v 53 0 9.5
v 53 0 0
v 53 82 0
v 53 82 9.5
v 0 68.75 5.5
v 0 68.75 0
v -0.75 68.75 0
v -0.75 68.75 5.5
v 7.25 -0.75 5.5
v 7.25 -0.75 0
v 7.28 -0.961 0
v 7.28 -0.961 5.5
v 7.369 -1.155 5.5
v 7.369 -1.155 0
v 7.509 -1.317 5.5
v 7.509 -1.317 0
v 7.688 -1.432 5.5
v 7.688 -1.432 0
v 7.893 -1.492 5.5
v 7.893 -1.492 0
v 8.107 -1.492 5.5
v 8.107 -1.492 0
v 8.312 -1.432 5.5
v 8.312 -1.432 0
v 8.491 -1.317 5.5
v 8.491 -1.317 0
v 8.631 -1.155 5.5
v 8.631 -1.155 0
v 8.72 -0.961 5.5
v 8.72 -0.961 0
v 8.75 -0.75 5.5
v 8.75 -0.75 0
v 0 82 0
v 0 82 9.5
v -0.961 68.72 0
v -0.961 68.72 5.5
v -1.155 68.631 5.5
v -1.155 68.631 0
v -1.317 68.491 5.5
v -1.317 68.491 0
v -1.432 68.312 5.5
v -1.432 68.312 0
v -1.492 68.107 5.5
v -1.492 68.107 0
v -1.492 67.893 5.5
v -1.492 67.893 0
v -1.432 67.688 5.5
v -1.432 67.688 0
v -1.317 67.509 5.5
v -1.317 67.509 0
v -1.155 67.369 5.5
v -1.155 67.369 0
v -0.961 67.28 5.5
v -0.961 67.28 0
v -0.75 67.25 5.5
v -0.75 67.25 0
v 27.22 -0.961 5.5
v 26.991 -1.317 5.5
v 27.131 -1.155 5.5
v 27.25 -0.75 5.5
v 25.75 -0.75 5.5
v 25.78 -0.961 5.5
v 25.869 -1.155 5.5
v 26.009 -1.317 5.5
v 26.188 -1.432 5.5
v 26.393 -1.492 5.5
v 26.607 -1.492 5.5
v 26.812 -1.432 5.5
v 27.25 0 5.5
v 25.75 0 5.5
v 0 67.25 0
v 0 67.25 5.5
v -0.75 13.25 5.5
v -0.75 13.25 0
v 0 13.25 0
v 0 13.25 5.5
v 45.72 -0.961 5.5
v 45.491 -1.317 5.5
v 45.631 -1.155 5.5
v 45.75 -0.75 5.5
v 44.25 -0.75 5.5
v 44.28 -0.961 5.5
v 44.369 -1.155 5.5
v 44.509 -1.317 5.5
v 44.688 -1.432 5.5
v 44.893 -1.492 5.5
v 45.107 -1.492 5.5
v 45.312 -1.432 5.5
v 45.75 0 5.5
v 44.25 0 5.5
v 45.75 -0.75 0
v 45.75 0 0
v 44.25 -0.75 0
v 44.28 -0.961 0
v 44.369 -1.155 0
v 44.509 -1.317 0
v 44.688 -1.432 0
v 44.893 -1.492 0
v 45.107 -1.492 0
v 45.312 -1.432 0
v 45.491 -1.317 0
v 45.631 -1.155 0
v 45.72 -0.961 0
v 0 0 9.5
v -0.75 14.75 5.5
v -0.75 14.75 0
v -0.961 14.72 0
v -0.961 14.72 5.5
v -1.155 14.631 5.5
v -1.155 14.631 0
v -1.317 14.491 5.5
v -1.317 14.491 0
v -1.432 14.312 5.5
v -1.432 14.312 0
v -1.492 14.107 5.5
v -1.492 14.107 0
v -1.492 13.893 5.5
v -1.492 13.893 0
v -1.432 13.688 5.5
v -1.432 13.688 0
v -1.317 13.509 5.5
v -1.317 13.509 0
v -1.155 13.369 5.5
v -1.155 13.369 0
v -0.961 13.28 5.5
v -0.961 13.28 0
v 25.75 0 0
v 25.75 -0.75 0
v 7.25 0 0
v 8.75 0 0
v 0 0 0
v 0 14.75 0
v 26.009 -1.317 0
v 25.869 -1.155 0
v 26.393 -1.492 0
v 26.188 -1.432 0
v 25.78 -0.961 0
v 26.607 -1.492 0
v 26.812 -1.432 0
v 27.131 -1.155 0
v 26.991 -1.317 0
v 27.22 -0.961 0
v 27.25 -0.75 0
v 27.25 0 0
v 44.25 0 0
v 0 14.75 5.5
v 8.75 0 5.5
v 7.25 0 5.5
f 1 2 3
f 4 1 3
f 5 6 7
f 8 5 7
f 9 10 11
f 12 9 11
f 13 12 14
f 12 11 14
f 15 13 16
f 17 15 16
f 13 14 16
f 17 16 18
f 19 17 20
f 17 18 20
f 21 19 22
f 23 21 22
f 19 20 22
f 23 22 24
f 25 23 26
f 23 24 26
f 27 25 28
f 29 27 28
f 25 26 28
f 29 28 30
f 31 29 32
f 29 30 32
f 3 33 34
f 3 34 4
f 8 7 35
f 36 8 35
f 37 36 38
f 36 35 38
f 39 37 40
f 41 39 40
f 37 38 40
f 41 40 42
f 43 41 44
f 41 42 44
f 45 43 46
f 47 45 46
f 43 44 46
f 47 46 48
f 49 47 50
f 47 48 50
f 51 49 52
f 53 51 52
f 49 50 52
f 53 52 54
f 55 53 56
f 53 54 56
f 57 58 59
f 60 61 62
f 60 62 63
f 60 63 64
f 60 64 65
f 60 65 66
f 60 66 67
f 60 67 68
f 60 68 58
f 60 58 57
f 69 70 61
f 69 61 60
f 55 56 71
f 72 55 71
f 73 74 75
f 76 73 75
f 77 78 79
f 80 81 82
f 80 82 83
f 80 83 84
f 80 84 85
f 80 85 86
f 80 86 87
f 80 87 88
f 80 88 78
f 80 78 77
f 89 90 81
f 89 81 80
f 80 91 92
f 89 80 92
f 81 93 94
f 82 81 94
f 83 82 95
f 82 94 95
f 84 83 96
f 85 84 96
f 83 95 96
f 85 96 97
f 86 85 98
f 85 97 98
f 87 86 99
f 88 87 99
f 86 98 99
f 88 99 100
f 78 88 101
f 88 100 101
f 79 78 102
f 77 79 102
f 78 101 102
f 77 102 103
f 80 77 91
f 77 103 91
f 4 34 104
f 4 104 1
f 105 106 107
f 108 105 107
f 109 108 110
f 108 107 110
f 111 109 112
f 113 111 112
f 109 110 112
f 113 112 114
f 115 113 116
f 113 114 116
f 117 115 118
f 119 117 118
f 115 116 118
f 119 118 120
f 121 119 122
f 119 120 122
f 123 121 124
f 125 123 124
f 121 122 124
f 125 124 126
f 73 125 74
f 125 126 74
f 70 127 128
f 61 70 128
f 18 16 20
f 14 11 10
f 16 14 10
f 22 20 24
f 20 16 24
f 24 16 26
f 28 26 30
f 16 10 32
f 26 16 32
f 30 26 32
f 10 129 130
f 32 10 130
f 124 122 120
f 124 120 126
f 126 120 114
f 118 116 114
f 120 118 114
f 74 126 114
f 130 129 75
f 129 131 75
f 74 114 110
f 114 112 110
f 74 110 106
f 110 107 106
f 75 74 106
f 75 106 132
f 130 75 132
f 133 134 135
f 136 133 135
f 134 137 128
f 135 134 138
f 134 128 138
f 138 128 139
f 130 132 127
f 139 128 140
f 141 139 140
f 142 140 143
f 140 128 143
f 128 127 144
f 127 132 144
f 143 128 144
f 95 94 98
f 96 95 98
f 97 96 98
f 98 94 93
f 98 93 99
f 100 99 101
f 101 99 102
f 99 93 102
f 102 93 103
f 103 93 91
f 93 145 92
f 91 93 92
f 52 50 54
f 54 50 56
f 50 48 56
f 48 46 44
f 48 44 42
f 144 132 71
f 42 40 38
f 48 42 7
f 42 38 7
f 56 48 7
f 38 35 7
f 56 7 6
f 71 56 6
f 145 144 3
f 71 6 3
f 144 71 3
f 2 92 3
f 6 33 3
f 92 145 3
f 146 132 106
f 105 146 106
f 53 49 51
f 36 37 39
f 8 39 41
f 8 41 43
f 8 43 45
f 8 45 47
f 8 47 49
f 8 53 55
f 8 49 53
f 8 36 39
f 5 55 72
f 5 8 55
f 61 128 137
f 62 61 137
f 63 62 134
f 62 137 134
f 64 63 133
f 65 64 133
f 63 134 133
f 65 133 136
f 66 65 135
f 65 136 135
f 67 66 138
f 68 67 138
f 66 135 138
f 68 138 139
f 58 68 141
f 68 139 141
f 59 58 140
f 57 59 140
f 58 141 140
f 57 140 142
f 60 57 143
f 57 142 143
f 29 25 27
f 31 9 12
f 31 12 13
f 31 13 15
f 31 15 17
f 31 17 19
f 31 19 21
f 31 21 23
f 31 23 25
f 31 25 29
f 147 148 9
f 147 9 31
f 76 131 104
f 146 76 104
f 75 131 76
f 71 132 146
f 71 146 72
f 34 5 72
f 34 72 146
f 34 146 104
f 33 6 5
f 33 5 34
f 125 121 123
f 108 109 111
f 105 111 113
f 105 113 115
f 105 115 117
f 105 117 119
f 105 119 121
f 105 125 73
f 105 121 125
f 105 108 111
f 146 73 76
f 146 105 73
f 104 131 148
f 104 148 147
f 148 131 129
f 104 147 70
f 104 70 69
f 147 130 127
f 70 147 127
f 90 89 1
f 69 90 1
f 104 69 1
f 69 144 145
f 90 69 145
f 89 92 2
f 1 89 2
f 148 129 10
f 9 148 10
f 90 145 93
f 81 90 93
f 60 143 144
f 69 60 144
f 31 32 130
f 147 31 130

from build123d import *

# Parameters (mm, degrees)
EXTRUDE_1_DEPTH = 9.5
EXTRUDE_2_DEPTH = 5.5


with BuildPart() as part:
    # ｽｹｯﾁ1 → ﾎﾞｽ - 押し出し1 (new body)
    with BuildSketch(Plane.XY):
        Polygon((0, 82), (0, 68.75), (0, 67.25), (0, 14.75), (0, 13.25), (0, 0), (7.25, 0), (8.75, 0), (25.75, 0), (27.25, 0), (44.25, 0), (45.75, 0), (53, 0), (53, 82), align=None)
    extrude(amount=EXTRUDE_1_DEPTH)

    # ｽｹｯﾁ1<3> → ﾎﾞｽ - 押し出し2 (add)
    with BuildSketch(Plane.XY):
        with BuildLine():
            Line((0, 68.75), (-0.75, 68.75))
            ThreePointArc((-0.75, 68.75), (-1.5, 68), (-0.75, 67.25))
            Line((-0.75, 67.25), (0, 67.25))
            Line((0, 67.25), (0, 68.75))
        make_face()
        with BuildLine():
            Line((0, 13.25), (0, 14.75))
            Line((0, 14.75), (-0.75, 14.75))
            ThreePointArc((-0.75, 14.75), (-1.5, 14), (-0.75, 13.25))
            Line((-0.75, 13.25), (0, 13.25))
        make_face()
        with BuildLine():
            Line((45.75, -0.75), (45.75, 0))
            Line((45.75, 0), (44.25, 0))
            Line((44.25, 0), (44.25, -0.75))
            ThreePointArc((44.25, -0.75), (45, -1.5), (45.75, -0.75))
        make_face()
        with BuildLine():
            Line((8.75, 0), (7.25, 0))
            Line((7.25, 0), (7.25, -0.75))
            ThreePointArc((7.25, -0.75), (8, -1.5), (8.75, -0.75))
            Line((8.75, -0.75), (8.75, 0))
        make_face()
        with BuildLine():
            Line((27.25, -0.75), (27.25, 0))
            Line((27.25, 0), (25.75, 0))
            Line((25.75, 0), (25.75, -0.75))
            ThreePointArc((25.75, -0.75), (26.5, -1.5), (27.25, -0.75))
        make_face()
    extrude(amount=EXTRUDE_2_DEPTH)


solid = part.part
